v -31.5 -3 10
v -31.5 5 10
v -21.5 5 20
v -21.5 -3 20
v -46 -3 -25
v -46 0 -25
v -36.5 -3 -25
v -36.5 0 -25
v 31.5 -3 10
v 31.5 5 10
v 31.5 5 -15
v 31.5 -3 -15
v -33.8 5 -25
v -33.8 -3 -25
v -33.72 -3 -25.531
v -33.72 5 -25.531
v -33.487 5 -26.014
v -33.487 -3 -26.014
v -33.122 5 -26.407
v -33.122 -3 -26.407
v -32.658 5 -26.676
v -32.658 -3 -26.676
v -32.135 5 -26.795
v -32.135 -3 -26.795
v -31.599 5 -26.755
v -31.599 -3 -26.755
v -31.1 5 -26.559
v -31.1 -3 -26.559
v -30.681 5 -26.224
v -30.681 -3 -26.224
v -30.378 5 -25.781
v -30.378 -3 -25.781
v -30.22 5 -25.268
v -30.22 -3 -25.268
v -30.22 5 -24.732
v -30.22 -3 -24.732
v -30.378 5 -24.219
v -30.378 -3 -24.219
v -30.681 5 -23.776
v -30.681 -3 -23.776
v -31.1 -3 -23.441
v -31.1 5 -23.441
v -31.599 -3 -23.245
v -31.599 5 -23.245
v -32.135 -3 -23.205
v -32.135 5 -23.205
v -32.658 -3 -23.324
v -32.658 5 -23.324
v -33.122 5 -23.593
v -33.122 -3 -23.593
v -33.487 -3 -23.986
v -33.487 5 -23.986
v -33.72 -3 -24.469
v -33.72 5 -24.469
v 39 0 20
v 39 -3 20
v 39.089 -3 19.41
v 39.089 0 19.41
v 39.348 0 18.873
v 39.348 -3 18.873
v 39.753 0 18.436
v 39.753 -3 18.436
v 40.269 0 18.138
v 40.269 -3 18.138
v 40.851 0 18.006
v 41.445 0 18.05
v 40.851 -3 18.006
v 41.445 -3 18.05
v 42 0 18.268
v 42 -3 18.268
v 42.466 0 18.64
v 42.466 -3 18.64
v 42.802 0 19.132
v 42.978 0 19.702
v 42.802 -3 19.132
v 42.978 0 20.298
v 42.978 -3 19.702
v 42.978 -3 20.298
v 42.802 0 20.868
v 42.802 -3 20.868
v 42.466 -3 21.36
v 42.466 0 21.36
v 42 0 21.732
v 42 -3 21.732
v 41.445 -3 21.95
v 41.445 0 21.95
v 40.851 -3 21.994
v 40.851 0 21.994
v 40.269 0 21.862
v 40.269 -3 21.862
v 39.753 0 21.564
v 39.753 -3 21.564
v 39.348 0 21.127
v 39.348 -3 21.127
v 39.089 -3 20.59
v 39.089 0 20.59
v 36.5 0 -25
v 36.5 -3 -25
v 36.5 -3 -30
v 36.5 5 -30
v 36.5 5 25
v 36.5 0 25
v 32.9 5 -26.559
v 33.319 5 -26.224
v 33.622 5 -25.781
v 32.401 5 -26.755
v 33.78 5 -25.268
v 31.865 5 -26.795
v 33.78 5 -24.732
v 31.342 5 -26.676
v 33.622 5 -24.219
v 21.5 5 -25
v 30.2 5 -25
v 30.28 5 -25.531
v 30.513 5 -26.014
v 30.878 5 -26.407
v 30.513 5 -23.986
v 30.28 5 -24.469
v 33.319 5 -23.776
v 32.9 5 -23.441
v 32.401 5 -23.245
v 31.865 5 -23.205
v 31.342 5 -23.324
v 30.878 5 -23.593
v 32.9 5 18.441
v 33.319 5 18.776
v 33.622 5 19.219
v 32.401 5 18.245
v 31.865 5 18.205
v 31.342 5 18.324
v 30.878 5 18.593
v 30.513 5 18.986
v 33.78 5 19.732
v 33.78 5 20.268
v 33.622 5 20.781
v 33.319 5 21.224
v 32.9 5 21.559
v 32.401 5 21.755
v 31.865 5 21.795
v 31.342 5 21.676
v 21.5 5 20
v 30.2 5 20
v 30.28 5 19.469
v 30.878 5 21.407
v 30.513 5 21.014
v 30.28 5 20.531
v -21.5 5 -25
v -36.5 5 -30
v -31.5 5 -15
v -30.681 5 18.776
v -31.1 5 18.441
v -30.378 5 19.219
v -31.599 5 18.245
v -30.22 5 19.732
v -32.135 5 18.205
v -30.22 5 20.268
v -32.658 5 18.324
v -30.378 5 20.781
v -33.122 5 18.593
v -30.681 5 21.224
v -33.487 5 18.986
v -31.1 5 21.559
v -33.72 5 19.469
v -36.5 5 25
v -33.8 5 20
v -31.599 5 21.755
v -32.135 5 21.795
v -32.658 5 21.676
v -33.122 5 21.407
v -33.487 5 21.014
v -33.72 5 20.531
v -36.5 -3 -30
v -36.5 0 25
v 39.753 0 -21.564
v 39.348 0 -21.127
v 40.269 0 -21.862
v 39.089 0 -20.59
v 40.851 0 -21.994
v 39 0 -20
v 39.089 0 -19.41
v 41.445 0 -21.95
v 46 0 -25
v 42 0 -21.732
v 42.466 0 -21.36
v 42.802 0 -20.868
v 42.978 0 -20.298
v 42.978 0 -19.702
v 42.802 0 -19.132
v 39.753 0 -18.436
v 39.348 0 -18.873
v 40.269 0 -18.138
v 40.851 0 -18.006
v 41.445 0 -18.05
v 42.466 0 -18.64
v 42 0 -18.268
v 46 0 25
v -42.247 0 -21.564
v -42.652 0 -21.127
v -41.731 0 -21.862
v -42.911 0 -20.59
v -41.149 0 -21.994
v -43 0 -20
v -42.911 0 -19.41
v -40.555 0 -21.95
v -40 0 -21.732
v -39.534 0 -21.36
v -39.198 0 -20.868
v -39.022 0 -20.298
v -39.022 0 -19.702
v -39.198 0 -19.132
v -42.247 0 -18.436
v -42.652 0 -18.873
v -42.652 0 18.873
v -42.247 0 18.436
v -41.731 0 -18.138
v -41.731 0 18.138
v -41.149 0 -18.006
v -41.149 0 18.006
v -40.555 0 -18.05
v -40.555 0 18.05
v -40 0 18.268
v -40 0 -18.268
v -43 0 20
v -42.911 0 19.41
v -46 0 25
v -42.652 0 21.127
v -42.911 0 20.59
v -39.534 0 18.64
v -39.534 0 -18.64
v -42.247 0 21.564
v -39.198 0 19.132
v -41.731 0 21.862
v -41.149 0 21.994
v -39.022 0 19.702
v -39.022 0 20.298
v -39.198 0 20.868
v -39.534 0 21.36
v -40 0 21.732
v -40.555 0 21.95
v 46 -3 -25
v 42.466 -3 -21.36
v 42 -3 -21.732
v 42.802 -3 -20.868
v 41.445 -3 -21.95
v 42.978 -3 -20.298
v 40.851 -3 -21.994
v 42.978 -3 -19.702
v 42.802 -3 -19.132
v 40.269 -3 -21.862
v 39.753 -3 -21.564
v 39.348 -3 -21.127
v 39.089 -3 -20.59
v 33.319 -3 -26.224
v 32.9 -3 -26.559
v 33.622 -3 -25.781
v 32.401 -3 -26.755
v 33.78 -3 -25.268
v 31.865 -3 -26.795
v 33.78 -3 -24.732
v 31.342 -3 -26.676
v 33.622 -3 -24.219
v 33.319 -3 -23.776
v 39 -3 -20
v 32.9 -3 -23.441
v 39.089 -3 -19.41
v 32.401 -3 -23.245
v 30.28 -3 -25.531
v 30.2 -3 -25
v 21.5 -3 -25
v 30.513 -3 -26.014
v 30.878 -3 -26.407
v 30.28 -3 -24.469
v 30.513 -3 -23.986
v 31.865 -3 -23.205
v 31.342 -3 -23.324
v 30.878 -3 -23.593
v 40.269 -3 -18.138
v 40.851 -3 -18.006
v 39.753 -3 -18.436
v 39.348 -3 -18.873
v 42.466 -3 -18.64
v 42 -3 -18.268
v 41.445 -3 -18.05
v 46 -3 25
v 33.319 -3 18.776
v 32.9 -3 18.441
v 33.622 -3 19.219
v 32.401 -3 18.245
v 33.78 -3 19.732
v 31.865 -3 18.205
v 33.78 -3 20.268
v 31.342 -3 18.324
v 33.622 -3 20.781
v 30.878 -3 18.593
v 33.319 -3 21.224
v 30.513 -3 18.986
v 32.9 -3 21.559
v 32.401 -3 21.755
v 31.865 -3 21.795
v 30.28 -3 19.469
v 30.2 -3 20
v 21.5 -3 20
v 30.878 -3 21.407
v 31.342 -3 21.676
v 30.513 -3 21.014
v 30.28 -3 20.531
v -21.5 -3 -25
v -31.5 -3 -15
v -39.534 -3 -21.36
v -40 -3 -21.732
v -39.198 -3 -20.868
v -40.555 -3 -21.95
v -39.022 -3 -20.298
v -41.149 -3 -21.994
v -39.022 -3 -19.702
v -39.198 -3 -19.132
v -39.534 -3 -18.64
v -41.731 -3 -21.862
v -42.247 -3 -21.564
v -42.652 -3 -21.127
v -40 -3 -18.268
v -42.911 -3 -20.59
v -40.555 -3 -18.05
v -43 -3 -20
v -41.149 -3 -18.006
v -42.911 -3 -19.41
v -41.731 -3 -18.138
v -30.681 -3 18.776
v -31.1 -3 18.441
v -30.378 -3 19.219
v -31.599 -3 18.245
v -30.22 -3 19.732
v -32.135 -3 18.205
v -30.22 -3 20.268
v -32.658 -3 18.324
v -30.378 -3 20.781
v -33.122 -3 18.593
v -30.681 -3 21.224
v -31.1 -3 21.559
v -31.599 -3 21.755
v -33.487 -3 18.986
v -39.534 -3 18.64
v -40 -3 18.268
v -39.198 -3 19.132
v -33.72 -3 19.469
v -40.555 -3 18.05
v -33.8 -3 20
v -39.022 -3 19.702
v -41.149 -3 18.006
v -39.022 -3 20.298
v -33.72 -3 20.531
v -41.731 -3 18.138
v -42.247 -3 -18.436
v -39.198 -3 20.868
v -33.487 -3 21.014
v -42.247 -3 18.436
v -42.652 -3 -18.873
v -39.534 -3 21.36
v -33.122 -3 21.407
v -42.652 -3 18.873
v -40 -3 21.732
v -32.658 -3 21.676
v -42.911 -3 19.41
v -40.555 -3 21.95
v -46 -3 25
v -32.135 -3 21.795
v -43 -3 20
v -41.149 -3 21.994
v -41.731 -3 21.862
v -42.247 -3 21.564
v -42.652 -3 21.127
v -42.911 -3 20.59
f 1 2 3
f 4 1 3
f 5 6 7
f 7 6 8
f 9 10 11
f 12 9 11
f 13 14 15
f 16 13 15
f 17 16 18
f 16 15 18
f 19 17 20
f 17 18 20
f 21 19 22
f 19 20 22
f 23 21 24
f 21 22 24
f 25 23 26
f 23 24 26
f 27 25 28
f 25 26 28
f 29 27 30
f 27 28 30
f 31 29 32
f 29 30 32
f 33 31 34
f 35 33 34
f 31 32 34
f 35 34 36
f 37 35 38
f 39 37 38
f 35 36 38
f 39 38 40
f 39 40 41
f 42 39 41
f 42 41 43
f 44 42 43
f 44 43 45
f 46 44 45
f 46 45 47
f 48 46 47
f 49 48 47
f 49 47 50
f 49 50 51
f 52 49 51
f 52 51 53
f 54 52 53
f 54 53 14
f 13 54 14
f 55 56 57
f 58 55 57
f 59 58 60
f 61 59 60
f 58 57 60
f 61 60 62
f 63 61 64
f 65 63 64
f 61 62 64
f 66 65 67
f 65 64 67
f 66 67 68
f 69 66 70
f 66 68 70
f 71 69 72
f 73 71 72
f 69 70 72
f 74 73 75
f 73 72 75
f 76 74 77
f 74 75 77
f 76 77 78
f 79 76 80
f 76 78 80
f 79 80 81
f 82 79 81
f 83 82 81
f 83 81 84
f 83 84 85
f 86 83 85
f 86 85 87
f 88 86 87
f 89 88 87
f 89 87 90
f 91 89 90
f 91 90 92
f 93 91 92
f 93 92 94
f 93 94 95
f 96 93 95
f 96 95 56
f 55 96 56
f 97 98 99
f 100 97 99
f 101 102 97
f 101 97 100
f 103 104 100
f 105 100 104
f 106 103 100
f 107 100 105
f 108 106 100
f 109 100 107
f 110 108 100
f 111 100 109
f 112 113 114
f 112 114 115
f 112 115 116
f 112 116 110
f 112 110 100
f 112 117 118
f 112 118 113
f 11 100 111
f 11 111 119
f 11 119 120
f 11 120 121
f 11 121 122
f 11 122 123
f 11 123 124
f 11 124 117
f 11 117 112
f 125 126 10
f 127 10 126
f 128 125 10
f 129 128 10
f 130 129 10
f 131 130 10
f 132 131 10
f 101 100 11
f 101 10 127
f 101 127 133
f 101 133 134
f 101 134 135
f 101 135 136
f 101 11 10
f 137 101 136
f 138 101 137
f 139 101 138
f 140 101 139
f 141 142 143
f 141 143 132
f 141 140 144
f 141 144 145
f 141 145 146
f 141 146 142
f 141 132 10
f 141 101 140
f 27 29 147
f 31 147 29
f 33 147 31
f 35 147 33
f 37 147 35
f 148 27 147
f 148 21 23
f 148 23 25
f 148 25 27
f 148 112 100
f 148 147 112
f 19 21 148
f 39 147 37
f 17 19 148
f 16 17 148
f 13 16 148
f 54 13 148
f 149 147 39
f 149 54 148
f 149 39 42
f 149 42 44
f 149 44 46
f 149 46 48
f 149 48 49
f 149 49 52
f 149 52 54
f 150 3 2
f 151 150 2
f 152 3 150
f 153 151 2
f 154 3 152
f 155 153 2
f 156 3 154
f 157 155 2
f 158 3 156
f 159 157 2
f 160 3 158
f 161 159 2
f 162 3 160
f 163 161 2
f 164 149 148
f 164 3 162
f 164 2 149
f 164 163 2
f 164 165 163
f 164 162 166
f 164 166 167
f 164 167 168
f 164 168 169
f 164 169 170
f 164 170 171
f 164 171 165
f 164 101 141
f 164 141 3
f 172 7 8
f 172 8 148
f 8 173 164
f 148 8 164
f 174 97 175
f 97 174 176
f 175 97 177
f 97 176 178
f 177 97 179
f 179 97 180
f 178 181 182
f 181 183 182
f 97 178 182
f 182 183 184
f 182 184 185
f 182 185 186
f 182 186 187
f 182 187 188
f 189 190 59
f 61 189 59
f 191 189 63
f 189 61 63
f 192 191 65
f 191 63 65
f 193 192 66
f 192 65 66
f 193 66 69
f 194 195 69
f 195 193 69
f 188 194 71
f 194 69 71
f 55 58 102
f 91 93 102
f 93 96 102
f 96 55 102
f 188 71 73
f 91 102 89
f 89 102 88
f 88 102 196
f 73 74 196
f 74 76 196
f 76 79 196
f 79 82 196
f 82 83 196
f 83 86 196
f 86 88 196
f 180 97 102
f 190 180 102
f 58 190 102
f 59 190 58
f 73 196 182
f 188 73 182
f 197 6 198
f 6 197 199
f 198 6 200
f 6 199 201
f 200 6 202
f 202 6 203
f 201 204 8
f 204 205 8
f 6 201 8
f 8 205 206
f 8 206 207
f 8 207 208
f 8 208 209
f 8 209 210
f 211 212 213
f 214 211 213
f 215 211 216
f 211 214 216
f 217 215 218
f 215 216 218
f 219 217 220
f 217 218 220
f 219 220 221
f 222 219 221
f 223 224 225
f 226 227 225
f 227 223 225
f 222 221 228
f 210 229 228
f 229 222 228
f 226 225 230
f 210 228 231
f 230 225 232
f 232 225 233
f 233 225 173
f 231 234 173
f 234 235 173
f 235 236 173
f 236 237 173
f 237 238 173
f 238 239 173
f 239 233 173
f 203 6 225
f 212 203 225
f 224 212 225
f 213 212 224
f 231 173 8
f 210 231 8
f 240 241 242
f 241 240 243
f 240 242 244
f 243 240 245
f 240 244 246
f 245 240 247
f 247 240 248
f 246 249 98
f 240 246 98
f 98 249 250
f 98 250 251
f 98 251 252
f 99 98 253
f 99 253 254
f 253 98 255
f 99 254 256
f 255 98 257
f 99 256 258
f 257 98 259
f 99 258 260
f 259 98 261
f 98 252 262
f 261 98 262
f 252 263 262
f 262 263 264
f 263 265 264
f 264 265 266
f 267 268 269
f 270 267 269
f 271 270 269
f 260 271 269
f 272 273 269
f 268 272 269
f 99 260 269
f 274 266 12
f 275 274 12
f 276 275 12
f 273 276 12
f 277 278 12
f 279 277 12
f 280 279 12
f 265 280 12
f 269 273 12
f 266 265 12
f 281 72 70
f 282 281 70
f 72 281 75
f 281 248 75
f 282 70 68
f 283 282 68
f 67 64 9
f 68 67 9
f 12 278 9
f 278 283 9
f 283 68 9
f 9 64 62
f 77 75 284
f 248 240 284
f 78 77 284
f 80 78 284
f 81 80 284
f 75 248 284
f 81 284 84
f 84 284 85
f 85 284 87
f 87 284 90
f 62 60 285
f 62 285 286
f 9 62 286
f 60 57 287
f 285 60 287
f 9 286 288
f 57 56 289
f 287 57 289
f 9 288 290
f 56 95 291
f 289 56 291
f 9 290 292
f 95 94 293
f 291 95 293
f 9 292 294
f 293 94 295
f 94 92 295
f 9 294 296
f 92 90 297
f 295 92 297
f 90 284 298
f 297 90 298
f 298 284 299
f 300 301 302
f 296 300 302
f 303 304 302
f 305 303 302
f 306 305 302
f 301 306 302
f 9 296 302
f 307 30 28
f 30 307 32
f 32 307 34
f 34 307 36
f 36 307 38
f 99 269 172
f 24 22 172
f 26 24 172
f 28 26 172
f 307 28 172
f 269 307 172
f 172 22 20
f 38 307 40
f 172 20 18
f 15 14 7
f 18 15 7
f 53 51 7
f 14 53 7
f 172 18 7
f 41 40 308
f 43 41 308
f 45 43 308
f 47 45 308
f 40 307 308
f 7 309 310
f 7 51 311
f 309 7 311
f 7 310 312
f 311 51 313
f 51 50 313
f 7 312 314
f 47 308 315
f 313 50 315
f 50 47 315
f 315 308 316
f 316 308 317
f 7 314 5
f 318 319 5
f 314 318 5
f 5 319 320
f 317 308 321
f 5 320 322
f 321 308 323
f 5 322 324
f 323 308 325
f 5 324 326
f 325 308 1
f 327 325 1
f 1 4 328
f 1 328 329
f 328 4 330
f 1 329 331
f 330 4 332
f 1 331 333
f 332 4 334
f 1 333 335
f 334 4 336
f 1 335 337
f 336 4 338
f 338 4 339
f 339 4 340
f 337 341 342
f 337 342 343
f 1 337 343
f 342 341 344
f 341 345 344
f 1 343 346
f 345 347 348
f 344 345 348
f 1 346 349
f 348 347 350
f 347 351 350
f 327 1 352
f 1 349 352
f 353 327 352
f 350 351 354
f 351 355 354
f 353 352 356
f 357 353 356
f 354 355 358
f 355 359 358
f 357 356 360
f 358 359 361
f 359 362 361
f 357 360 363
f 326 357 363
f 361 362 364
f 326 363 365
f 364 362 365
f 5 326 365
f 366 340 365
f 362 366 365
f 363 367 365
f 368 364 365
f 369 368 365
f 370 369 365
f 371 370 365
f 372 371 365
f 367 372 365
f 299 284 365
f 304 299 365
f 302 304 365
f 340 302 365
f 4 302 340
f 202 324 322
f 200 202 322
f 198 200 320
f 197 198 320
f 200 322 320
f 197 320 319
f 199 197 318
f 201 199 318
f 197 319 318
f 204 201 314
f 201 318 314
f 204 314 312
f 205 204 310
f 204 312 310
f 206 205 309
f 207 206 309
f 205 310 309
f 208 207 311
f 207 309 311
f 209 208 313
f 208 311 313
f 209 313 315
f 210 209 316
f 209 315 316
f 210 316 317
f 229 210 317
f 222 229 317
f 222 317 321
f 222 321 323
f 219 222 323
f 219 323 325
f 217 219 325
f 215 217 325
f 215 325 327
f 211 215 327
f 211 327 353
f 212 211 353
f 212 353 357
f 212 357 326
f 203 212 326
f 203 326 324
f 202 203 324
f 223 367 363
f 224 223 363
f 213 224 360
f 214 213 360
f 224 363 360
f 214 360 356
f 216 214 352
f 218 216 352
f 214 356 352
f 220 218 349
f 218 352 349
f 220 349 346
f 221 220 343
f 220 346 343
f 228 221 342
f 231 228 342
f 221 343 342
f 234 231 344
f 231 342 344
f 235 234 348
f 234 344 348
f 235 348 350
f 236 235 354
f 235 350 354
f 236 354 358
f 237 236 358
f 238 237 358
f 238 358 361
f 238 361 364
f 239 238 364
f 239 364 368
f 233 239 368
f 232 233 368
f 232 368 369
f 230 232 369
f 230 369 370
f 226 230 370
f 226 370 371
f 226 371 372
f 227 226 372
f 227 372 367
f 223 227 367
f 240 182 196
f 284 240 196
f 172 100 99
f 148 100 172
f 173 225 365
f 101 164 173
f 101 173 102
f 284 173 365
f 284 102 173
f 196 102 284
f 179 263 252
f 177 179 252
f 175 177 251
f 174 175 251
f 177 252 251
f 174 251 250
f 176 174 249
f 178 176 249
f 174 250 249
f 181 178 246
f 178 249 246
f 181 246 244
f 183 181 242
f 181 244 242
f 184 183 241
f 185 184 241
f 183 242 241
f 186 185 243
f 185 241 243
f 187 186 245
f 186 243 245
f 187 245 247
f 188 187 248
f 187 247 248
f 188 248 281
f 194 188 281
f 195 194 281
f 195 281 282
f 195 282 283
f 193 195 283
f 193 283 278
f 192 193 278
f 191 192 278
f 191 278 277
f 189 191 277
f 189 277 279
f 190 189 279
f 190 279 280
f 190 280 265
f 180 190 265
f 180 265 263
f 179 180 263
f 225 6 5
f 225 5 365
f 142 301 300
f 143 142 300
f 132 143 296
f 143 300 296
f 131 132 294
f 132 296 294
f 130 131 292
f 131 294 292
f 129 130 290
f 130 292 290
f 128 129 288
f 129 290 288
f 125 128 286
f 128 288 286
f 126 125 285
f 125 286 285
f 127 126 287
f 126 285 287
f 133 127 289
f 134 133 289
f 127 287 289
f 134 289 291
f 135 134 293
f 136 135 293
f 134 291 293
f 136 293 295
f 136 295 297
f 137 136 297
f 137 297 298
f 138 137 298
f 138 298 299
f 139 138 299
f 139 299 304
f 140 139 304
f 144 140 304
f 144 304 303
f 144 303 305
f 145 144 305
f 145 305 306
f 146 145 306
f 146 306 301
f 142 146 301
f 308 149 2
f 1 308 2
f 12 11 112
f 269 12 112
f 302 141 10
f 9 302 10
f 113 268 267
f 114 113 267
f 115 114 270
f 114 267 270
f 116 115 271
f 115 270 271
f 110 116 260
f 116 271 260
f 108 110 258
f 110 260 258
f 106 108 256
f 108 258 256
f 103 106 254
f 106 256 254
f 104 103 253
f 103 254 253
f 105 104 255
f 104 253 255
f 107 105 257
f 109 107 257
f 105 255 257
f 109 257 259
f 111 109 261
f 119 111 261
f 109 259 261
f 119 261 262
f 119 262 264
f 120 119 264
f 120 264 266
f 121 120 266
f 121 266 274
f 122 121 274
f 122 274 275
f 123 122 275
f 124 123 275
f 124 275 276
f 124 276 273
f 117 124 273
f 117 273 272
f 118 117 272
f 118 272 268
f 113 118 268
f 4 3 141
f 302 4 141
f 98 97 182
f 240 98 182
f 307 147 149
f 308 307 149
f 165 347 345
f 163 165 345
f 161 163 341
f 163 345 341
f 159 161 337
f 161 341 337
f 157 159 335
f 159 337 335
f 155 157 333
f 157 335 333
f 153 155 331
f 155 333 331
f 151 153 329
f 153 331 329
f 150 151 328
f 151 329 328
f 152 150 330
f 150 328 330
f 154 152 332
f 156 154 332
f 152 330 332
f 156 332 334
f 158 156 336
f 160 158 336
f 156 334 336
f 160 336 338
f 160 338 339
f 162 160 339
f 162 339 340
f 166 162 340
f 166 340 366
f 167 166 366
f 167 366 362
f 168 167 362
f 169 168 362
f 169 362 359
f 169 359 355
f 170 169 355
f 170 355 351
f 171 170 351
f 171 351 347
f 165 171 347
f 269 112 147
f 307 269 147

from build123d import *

# Parameters (mm, degrees)
SKETCH1_W                = 73
SKETCH1_H                = 50
BOSS_EXTRUDE1_DEPTH      = 5
SKETCH2_W                = 92
SKETCH2_H                = 50
BOSS_EXTRUDE2_DEPTH      = 3
M3_CLEARANCE_HOLE1_D     = 4
M3_CLEARANCE_HOLE1_DEPTH = 10
M3_CLEARANCE_HOLE1_TIP   = 1.201721238
SKETCH9_W                = 73
SKETCH9_H                = 8
BOSS_EXTRUDE3_DEPTH      = 5
M3_CLEARANCE_HOLE3_D     = 3.6
M3_CLEARANCE_HOLE3_DEPTH = 10
M3_CLEARANCE_HOLE3_TIP   = 1.081549114
CUT_EXTRUDE1_DEPTH       = 9


with BuildPart() as part:
    # Sketch1 → Boss-Extrude1 (new body)
    with BuildSketch(Plane(origin=(0, 0, 0), x_dir=(1, 0, 0), z_dir=(0, 1, 0))):
        Rectangle(SKETCH1_W, SKETCH1_H)
    extrude(amount=BOSS_EXTRUDE1_DEPTH)

    # Sketch2 → Boss-Extrude2 (add)
    with BuildSketch(Plane.XZ):
        Rectangle(SKETCH2_W, SKETCH2_H)
    extrude(amount=BOSS_EXTRUDE2_DEPTH)

    # M3 Clearance Hole1
    with Locations(Plane(origin=(0, 0, 0), x_dir=(1, 0, 0), z_dir=(0, 1, 0))):
        with Locations((-41, 20), (-41, -20), (41, 20), (41, -20)):
            Hole(M3_CLEARANCE_HOLE1_D / 2, depth=M3_CLEARANCE_HOLE1_DEPTH)
            with Locations((0, 0, -(M3_CLEARANCE_HOLE1_DEPTH + M3_CLEARANCE_HOLE1_TIP / 2))):  # 118° drill point
                Cone(0, M3_CLEARANCE_HOLE1_D / 2, M3_CLEARANCE_HOLE1_TIP, mode=Mode.SUBTRACT)

    # Sketch9 → Boss-Extrude3 (add)
    with BuildSketch(Plane(origin=(0, 0, -25), x_dir=(-1, 0, 0), z_dir=(0, 0, -1))):
        with Locations((0, 1)):
            Rectangle(SKETCH9_W, SKETCH9_H)
    extrude(amount=BOSS_EXTRUDE3_DEPTH)

    # M3 Clearance Hole3
    with Locations(Plane(origin=(0, 5, 0), x_dir=(1, 0, 0), z_dir=(0, 1, 0))):
        with Locations((32, -20), (-32, 25), (32, 25), (-32, -20)):
            Hole(M3_CLEARANCE_HOLE3_D / 2, depth=M3_CLEARANCE_HOLE3_DEPTH)
            with Locations((0, 0, -(M3_CLEARANCE_HOLE3_DEPTH + M3_CLEARANCE_HOLE3_TIP / 2))):  # 118° drill point
                Cone(0, M3_CLEARANCE_HOLE3_D / 2, M3_CLEARANCE_HOLE3_TIP, mode=Mode.SUBTRACT)

    # Sketch12 → Cut-Extrude1 (cut, through all)
    with BuildSketch(Plane(origin=(0, 5, 0), x_dir=(1, 0, 0), z_dir=(0, 1, 0))):
        Polygon((21.5, -20), (31.5, -10), (31.5, 15), (21.5, 25), (-21.5, 25), (-31.5, 15), (-31.5, -10), (-21.5, -20), align=None)
    extrude(amount=-CUT_EXTRUDE1_DEPTH, mode=Mode.SUBTRACT)


solid = part.part
